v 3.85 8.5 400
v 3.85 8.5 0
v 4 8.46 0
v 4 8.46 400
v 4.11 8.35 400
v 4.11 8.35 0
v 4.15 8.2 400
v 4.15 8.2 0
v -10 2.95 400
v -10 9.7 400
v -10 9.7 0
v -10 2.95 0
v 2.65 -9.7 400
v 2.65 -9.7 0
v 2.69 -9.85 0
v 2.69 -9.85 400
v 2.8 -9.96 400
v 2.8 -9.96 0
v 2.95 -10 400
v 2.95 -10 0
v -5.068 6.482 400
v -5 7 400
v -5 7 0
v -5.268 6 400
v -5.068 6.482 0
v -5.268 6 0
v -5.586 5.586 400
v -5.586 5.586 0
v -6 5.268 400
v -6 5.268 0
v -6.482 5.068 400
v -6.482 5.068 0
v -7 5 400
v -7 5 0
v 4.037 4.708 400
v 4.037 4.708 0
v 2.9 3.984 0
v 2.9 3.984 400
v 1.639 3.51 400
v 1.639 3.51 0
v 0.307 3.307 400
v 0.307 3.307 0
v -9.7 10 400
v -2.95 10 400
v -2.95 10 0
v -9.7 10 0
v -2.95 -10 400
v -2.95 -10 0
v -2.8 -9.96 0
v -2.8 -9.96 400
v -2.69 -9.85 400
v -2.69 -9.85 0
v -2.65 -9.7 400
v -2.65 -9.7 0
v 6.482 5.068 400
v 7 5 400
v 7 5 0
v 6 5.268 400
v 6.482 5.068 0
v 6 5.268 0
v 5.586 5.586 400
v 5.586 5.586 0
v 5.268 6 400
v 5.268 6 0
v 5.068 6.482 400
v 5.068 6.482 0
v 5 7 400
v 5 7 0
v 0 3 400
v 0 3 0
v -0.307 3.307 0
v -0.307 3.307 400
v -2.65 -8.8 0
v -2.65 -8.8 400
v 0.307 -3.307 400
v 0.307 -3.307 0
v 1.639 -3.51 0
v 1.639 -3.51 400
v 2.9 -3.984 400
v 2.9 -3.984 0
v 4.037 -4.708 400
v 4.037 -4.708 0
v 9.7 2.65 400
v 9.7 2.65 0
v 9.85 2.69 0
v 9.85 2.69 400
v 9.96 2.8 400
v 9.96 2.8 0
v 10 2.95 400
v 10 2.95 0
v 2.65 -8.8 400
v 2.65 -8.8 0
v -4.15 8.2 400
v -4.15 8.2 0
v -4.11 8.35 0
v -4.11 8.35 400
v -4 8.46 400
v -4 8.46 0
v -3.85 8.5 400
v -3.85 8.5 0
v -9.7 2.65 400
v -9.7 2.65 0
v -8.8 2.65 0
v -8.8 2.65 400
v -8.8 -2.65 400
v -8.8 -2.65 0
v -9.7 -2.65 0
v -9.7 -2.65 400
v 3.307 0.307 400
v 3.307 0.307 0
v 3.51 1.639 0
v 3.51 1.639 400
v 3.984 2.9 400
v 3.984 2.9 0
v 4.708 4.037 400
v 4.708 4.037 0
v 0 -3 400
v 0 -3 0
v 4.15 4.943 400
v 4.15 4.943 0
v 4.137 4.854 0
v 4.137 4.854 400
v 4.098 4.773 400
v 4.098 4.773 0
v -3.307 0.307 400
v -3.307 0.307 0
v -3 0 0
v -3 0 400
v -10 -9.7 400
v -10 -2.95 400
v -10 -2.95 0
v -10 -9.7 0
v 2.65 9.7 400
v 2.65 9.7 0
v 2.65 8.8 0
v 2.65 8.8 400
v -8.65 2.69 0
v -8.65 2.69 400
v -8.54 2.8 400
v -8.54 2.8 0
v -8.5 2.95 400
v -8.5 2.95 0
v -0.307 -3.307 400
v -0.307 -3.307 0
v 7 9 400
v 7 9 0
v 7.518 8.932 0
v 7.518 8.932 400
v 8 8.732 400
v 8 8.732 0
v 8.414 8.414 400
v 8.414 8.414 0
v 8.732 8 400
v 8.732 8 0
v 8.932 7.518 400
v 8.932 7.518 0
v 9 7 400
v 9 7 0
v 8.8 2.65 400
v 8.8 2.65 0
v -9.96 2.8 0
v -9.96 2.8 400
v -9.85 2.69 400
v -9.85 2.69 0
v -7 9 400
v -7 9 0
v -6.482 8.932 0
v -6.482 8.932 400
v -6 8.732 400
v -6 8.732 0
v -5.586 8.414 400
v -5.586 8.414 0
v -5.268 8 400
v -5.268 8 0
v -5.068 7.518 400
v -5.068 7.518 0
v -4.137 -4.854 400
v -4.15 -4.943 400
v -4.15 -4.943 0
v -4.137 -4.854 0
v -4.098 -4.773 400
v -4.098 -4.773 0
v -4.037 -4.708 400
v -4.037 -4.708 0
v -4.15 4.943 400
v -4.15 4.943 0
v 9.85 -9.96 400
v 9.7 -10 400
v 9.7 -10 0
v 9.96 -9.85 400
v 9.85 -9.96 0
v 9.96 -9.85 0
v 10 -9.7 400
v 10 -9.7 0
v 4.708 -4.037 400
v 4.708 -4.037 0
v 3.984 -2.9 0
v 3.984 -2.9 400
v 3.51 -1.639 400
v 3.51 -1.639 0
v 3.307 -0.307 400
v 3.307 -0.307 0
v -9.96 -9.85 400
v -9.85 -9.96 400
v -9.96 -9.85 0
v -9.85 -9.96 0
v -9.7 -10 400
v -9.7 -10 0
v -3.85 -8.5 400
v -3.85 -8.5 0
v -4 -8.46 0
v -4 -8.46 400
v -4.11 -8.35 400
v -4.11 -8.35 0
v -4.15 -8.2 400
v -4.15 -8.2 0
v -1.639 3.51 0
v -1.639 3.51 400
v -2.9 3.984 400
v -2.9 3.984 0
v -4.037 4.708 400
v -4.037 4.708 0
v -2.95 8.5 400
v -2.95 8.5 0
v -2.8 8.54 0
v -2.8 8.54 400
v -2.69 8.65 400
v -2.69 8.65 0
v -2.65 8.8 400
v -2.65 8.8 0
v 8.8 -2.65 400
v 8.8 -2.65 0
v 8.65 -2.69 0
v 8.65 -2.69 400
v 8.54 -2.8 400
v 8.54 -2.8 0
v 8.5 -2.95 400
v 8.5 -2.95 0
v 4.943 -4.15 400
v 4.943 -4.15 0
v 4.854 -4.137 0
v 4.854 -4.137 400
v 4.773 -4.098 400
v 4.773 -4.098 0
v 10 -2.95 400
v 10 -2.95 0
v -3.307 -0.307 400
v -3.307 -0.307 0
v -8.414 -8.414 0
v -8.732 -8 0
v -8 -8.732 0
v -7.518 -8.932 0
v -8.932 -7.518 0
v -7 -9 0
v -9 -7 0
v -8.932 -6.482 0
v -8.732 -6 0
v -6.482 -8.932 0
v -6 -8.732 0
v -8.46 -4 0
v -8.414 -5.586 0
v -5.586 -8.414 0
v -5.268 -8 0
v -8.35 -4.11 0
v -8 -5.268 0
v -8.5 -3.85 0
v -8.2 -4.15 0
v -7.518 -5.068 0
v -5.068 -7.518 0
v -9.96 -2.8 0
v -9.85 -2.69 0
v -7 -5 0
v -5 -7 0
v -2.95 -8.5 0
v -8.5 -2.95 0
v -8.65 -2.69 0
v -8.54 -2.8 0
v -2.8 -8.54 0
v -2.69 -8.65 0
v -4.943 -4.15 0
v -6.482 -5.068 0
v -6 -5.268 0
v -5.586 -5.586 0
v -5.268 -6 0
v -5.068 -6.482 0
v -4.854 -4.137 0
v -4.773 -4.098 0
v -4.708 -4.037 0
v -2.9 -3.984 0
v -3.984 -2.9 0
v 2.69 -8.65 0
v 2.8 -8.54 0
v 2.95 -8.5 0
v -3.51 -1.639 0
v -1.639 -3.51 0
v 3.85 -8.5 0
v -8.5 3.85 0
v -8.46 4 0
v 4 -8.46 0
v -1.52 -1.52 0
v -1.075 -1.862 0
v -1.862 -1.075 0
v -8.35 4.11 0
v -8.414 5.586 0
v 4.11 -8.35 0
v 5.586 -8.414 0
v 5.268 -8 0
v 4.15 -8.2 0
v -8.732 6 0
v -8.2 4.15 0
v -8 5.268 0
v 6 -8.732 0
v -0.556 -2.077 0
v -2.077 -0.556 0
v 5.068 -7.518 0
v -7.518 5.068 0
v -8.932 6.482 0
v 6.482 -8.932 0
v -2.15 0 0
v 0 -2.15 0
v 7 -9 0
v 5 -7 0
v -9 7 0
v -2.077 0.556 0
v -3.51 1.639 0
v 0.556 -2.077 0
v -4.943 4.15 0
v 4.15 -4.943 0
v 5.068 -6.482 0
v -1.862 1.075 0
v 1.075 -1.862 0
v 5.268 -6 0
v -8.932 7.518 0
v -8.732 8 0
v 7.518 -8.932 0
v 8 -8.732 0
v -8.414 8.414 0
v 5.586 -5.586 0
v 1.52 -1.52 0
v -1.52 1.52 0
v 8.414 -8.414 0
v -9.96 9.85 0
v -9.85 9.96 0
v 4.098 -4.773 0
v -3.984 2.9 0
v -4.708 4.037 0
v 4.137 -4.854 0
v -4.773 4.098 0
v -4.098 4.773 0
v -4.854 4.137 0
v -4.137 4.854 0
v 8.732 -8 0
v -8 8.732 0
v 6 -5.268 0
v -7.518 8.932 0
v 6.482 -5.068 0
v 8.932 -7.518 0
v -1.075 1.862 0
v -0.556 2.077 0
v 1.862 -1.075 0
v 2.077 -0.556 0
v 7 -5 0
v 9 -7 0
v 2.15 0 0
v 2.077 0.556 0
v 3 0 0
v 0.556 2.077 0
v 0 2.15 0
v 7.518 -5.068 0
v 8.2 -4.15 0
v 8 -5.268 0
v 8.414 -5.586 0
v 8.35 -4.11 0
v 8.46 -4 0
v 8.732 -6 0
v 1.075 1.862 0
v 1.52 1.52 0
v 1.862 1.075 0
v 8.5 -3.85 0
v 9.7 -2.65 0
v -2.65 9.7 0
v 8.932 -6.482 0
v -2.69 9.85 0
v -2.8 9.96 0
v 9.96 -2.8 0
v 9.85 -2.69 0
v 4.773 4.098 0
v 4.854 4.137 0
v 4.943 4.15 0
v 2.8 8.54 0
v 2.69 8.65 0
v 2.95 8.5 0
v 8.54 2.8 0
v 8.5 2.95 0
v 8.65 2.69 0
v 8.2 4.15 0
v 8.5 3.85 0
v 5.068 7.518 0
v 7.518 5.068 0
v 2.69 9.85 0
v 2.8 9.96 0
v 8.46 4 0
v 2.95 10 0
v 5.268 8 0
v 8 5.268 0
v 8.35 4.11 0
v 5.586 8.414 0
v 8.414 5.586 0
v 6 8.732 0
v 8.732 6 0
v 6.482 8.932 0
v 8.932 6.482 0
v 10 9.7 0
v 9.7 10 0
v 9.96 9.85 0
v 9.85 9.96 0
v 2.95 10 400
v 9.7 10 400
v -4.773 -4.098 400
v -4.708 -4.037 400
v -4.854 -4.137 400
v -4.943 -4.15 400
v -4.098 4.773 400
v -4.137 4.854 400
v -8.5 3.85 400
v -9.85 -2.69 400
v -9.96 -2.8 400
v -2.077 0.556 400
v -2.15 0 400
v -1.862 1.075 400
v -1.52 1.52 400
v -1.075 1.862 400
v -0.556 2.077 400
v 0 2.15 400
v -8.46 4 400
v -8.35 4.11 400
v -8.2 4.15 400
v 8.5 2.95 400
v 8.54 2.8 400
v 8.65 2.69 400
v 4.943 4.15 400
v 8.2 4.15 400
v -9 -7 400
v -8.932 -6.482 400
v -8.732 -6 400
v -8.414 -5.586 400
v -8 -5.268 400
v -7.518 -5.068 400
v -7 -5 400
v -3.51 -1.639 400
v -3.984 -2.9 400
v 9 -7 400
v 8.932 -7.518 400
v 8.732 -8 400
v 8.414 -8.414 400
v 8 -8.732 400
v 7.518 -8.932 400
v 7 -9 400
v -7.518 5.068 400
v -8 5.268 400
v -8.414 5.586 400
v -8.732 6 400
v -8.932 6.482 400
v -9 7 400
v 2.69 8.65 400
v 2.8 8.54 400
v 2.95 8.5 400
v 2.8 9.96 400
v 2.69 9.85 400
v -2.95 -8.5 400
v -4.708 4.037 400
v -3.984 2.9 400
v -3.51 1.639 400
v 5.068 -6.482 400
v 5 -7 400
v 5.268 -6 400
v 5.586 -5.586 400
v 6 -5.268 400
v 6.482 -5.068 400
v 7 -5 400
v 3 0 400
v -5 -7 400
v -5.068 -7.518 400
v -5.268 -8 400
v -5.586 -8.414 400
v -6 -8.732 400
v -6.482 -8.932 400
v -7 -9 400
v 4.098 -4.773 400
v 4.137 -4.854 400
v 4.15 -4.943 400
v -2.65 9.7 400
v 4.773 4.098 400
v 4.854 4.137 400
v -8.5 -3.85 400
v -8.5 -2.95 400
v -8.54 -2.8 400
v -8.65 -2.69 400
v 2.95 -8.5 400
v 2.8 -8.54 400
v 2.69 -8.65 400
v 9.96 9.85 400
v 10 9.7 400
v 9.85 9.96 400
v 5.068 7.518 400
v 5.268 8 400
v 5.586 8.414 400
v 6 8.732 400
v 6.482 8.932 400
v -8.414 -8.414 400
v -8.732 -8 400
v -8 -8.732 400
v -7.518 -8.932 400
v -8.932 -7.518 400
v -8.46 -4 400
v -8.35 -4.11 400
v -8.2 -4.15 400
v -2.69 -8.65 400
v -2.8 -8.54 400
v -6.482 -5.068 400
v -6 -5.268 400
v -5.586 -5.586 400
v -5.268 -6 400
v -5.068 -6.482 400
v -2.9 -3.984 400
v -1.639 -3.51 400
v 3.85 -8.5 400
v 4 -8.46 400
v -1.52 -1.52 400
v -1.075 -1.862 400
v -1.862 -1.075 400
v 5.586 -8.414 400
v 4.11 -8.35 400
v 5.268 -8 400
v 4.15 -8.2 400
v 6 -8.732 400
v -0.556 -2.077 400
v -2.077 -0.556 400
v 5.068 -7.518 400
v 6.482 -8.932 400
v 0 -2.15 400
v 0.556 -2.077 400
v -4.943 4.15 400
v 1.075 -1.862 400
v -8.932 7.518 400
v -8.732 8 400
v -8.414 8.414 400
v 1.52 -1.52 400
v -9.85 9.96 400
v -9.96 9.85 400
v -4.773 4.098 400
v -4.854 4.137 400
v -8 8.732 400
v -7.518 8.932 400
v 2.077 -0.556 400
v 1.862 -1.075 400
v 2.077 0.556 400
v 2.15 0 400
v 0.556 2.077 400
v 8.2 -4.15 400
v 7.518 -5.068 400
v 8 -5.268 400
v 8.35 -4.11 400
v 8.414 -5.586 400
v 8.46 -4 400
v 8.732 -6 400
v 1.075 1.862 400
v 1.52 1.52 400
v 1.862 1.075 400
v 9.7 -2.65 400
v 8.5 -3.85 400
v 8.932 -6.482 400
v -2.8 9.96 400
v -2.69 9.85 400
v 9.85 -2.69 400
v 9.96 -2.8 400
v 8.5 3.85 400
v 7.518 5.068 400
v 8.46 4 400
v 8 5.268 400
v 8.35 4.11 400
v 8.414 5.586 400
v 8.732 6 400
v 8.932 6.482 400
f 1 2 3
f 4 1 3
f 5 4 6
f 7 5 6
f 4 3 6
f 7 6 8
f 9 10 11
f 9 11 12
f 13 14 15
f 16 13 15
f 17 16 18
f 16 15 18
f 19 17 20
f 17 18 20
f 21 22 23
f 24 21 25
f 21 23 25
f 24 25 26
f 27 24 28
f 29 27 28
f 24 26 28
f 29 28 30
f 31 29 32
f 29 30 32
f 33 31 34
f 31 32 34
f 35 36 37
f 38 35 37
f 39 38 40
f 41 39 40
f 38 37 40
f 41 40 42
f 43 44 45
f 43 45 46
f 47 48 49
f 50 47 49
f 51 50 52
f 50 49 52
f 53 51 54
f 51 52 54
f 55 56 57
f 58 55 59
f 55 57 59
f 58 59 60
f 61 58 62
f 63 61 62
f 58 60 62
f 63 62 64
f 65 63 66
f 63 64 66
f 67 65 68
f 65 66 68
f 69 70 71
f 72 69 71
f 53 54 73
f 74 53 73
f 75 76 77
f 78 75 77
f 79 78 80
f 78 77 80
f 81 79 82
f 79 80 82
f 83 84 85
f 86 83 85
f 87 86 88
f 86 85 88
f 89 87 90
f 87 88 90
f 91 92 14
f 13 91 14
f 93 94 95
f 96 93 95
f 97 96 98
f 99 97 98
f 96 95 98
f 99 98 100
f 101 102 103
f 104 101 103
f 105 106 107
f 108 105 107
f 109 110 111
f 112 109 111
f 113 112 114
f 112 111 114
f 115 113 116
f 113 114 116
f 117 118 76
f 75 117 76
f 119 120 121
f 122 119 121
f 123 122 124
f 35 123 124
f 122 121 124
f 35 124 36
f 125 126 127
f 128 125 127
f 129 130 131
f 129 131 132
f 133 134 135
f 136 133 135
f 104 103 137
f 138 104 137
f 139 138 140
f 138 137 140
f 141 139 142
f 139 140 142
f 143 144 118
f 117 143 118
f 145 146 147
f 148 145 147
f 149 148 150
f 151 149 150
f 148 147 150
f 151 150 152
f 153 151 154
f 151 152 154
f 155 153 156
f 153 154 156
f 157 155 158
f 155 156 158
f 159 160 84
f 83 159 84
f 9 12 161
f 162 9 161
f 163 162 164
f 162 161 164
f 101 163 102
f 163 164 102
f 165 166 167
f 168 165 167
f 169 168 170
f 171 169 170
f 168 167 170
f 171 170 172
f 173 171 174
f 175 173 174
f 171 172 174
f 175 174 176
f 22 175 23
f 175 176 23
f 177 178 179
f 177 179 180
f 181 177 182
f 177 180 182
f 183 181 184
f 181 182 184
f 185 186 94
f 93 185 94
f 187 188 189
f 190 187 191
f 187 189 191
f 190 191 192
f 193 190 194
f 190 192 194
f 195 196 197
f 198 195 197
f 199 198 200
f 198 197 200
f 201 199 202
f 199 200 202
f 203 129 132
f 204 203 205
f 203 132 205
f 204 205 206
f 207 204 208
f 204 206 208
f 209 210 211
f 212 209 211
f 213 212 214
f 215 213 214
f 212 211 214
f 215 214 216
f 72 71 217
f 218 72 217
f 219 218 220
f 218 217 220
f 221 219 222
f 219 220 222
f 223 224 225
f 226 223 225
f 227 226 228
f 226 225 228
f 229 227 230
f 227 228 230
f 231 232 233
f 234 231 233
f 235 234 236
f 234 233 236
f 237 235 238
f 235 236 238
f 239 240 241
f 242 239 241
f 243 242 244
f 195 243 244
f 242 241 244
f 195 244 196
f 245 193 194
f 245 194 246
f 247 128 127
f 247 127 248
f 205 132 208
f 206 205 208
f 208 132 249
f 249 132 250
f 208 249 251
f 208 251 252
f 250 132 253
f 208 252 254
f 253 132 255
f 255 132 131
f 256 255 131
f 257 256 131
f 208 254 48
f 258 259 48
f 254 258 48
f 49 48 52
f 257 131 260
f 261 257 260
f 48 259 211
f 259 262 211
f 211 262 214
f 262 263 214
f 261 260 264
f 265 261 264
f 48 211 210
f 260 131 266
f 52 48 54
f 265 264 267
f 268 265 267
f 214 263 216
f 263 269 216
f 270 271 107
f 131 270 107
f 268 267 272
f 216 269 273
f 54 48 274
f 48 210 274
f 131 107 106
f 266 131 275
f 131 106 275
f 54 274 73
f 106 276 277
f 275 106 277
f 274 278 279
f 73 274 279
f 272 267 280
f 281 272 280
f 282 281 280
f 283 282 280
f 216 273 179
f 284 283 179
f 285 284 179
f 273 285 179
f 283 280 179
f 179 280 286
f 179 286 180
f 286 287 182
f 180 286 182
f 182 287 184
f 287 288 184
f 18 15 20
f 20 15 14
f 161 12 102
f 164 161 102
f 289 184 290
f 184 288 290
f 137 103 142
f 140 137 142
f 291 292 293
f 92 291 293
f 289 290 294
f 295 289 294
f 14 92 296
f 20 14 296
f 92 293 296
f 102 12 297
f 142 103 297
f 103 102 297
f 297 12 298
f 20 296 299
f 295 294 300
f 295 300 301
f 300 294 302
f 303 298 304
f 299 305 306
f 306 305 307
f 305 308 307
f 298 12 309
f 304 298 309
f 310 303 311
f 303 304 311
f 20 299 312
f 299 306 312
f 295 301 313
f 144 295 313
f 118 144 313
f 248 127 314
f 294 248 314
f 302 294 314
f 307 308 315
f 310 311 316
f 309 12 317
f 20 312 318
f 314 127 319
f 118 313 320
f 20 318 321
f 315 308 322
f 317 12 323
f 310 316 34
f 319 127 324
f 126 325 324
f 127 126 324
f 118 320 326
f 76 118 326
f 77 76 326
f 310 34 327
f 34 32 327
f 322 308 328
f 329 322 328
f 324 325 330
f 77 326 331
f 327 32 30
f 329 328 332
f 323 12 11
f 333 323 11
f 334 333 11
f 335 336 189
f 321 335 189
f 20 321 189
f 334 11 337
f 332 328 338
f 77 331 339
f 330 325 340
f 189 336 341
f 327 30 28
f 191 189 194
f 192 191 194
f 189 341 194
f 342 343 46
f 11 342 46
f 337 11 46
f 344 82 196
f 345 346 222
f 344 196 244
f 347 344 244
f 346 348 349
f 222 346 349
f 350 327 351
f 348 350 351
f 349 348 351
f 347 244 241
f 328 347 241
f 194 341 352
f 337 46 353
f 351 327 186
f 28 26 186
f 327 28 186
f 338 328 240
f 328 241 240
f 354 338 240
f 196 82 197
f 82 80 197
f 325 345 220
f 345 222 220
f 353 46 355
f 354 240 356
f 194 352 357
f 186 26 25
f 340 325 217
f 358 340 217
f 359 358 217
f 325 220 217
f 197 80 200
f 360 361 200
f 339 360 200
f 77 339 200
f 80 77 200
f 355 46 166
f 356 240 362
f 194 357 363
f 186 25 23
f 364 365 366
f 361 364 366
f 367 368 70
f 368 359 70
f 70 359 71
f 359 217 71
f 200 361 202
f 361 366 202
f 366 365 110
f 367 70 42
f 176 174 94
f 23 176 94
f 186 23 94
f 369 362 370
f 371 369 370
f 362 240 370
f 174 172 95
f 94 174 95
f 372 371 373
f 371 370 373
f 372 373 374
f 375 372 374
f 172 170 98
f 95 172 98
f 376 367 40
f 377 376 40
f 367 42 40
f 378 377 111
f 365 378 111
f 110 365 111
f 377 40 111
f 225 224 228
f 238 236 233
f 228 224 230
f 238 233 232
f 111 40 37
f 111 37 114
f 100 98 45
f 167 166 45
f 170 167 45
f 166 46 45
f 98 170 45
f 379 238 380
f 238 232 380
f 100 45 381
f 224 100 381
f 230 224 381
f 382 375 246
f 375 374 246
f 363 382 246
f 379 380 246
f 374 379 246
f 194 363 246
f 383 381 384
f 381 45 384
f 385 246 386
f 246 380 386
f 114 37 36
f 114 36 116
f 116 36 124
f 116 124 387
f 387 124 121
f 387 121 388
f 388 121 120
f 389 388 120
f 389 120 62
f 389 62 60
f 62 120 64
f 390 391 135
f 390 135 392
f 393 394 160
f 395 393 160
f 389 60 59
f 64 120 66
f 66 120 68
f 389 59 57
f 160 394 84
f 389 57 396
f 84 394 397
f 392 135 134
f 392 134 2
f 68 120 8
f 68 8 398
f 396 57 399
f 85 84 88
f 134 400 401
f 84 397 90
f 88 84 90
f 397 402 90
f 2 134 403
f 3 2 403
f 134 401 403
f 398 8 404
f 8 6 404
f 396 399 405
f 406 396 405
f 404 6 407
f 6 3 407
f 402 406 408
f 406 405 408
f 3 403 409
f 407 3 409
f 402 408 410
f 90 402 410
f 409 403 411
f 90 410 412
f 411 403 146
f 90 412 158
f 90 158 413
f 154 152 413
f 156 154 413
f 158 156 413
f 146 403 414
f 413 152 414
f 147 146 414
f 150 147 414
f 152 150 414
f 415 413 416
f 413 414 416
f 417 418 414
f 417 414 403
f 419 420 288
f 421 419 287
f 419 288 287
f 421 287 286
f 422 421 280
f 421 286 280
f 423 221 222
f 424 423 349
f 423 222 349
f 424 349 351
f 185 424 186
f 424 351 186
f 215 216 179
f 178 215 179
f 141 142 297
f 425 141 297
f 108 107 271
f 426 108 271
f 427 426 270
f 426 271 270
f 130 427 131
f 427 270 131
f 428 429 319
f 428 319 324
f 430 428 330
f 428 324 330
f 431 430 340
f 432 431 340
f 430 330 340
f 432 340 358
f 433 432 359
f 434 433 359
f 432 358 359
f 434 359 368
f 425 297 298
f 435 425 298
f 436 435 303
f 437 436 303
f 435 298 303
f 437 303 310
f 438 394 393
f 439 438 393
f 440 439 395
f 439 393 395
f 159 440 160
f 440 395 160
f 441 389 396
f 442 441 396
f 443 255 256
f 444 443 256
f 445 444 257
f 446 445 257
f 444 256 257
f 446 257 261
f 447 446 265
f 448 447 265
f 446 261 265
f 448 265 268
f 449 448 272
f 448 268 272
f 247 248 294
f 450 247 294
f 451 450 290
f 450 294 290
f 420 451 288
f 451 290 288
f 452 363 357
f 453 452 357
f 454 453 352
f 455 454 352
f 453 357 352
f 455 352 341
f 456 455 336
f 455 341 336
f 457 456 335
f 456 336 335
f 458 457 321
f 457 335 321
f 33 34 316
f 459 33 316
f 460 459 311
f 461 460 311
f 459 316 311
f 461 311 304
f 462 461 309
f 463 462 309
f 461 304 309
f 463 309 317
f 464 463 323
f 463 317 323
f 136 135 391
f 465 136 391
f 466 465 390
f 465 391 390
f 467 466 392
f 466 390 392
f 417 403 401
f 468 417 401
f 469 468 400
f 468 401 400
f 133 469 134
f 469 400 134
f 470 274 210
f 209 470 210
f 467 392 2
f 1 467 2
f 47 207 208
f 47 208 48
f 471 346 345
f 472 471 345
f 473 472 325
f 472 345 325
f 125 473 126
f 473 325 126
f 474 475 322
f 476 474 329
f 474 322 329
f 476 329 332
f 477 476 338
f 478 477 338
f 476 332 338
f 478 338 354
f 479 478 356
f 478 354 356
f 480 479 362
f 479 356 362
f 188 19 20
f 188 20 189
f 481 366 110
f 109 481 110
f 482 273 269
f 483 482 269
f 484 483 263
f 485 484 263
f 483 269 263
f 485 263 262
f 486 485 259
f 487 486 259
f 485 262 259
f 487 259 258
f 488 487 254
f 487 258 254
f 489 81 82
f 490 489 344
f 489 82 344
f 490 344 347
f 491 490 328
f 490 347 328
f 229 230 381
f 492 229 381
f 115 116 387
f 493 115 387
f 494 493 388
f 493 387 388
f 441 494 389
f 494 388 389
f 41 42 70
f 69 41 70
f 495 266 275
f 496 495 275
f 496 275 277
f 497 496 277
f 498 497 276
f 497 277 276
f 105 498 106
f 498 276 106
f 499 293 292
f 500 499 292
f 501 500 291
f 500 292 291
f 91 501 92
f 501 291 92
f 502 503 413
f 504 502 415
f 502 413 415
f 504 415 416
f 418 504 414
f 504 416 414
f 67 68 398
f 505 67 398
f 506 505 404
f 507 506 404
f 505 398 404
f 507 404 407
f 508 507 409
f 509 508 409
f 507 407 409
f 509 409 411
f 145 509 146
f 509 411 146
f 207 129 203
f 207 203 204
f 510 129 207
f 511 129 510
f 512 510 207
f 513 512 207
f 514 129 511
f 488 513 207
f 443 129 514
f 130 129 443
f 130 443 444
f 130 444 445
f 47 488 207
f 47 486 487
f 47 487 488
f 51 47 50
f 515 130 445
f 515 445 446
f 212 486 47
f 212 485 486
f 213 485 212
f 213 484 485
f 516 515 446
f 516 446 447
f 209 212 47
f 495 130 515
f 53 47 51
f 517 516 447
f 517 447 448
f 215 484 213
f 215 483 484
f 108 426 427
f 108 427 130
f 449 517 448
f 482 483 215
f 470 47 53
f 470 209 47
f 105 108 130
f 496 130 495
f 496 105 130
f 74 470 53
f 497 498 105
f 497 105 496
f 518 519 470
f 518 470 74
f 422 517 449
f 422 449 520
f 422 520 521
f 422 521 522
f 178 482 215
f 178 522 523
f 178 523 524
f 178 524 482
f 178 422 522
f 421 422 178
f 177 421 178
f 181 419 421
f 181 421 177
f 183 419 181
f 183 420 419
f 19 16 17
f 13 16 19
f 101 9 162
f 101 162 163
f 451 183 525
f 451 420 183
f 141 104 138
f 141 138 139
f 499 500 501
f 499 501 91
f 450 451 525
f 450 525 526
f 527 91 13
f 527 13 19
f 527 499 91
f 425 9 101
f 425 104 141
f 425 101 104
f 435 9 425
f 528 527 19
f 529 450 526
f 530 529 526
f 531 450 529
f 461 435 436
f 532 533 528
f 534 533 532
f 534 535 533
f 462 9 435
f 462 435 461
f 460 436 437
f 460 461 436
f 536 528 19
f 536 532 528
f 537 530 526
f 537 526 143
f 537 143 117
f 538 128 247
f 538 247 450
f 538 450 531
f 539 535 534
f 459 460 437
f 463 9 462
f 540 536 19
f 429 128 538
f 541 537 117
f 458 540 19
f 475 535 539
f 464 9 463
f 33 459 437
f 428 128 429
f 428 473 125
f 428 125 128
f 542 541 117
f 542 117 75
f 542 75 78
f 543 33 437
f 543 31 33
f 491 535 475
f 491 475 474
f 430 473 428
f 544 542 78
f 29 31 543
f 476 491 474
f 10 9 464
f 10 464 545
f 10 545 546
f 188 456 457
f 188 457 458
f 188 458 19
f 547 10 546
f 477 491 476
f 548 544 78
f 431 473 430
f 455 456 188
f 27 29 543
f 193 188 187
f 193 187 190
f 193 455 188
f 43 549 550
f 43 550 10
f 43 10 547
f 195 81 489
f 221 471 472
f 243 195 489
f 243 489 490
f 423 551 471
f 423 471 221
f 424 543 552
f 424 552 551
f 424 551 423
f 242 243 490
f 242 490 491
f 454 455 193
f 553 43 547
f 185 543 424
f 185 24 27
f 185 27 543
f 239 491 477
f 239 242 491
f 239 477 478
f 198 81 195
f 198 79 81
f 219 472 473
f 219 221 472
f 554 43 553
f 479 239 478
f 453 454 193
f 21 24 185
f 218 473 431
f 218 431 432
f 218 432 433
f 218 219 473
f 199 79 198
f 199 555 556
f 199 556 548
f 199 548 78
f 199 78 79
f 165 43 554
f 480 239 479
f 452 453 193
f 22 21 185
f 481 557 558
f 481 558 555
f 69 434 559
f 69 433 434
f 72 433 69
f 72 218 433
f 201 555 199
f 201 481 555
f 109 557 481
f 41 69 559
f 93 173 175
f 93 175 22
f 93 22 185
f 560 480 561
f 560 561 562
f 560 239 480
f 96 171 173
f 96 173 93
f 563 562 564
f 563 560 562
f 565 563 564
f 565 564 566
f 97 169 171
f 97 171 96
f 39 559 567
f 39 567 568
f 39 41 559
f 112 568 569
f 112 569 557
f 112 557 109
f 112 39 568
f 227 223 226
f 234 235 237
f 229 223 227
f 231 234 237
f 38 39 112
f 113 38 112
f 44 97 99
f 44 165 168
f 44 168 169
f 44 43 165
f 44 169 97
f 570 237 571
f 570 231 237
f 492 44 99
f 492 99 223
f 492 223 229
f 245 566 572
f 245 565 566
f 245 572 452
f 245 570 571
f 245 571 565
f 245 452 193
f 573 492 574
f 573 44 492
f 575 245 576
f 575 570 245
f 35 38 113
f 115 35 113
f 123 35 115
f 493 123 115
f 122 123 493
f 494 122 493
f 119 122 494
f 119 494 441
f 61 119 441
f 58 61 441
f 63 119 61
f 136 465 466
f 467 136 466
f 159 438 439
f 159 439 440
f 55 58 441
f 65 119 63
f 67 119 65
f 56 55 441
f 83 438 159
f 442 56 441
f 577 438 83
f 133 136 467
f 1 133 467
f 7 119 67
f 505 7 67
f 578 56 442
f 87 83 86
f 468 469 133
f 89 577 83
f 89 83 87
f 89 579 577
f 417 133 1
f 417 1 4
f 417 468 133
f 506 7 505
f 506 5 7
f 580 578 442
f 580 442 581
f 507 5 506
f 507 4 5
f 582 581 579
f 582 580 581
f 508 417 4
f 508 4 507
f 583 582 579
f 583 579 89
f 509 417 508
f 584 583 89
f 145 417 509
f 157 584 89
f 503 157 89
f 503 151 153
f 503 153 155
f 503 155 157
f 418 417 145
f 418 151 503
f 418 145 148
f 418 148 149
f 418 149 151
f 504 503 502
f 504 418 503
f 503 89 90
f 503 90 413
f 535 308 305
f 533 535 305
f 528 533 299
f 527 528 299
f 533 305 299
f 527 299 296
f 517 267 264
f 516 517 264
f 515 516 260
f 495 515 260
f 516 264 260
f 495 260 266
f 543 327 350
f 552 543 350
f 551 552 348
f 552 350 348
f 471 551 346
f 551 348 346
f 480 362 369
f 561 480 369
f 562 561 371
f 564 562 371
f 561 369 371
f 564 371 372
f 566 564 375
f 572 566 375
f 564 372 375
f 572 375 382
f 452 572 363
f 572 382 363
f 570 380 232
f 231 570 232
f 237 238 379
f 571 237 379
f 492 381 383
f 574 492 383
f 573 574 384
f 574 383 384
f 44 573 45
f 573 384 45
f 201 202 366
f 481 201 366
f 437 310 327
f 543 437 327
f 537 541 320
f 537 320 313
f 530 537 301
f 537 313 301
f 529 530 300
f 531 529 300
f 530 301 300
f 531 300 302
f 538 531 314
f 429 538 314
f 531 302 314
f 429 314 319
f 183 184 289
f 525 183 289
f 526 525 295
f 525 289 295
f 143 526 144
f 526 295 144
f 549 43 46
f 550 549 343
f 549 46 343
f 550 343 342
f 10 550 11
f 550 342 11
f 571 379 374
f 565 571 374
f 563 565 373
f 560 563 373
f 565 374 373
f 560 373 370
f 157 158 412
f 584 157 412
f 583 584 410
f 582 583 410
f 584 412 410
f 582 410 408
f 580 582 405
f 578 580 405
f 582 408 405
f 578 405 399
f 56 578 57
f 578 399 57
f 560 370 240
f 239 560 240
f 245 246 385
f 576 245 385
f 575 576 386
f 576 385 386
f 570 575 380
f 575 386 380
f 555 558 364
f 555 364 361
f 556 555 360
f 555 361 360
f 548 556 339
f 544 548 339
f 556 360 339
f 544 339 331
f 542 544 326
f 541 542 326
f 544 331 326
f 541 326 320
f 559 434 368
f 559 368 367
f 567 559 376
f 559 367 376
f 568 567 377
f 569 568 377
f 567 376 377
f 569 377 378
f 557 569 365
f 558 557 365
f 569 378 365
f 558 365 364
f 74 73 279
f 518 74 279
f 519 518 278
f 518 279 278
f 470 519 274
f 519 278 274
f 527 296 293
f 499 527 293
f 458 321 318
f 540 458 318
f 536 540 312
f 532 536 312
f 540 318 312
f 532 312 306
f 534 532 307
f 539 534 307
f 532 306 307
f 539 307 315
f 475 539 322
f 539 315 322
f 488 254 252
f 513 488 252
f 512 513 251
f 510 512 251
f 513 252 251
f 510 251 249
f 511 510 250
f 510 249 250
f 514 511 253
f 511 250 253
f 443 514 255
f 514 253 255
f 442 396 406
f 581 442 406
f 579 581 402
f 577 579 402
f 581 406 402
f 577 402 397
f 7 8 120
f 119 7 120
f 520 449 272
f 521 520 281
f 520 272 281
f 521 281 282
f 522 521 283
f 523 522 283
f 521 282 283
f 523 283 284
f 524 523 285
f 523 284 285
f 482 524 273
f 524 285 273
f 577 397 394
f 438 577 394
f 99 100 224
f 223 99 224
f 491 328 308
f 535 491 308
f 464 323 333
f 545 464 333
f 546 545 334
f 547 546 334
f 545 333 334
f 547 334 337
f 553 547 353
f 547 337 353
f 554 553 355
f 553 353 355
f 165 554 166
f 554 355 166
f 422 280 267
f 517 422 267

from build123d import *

# Parameters (mm, degrees)
F1_DEPTH = 400


# Not quite as in the source:
# - ends of sketch curves that miss each other by under 0.0002 mm in the source are joined


with BuildPart() as f1:
    # F0 (on Top) → F1 (new body)
    with BuildSketch(Plane.XY):
        with BuildLine():
            ThreePointArc((0, 2.15), (1.5202795796, 1.5202795796), (2.15, 0))
            Line((2.15, 0), (3, 0))
            Line((3, 0), (3.307278, 0.307278))
            ThreePointArc((3.307278, 0.307278), (3.7143803747, 2.2820219924), (4.7078187099, 4.0365664363))
            ThreePointArc((4.7078187099, 4.0365664363), (4.812308461, 4.1201573706), (4.94275, 4.15))
            Line((4.94275, 4.15), (8.2, 4.15))
            ThreePointArc((8.2, 4.15), (8.4121320344, 4.0621320344), (8.5, 3.85))
            Line((8.5, 3.85), (8.5, 2.95))
            ThreePointArc((8.5, 2.95), (8.5878679656, 2.7378679656), (8.8, 2.65))
            Line((8.8, 2.65), (9.7, 2.65))
            ThreePointArc((9.7, 2.65), (9.9121320344, 2.7378679656), (10, 2.95))
            Line((10, 2.95), (10, 9.7))
            ThreePointArc((10, 9.7), (9.9121320344, 9.9121320344), (9.7, 10))
            Line((9.7, 10), (2.95, 10))
            ThreePointArc((2.95, 10), (2.7378679656, 9.9121320344), (2.65, 9.7))
            Line((2.65, 9.7), (2.65, 8.8))
            ThreePointArc((2.65, 8.8), (2.7378679656, 8.5878679656), (2.95, 8.5))
            Line((2.95, 8.5), (3.85, 8.5))
            ThreePointArc((3.85, 8.5), (4.0621320344, 8.4121320344), (4.15, 8.2))
            Line((4.15, 8.2), (4.15, 4.94275))
            ThreePointArc((4.15, 4.94275), (4.1201572004, 4.8123081084), (4.036566086, 4.7078178916))
            ThreePointArc((4.036566086, 4.7078178916), (2.2820216259, 3.7143802371), (0.3072779813, 3.3072783955))
            Line((0.3072779813, 3.3072783955), (0, 3))
            Line((0, 3), (0, 2.15))
        make_face()
        with BuildLine():
            ThreePointArc((7, 9), (8.4142135624, 8.4142135624), (9, 7))
            ThreePointArc((9, 7), (8.4142135624, 5.5857864376), (7, 5))
            ThreePointArc((7, 5), (5.5857864376, 5.5857864376), (5, 7))
            ThreePointArc((5, 7), (5.5857864376, 8.4142135624), (7, 9))
        make_face(mode=Mode.SUBTRACT)
        with BuildLine():
            Line((3, 0), (2.15, 0))
            ThreePointArc((2.15, 0), (1.5202795796, -1.5202795796), (0, -2.15))
            Line((0, -2.15), (0, -3))
            Line((0, -3), (0.307278, -3.307277))
            ThreePointArc((0.307278, -3.307277), (2.2820216259, -3.7143792371), (4.036565823, -4.7078172229))
            ThreePointArc((4.036565823, -4.7078172229), (4.1201572004, -4.8123071084), (4.15, -4.942749))
            Line((4.15, -4.942749), (4.15, -8.2))
            ThreePointArc((4.15, -8.2), (4.0621320344, -8.4121320344), (3.85, -8.5))
            Line((3.85, -8.5), (2.95, -8.5))
            ThreePointArc((2.95, -8.5), (2.7378679656, -8.5878679656), (2.65, -8.8))
            Line((2.65, -8.8), (2.65, -9.7))
            ThreePointArc((2.65, -9.7), (2.7378679656, -9.9121320344), (2.95, -10))
            Line((2.95, -10), (9.7, -10))
            ThreePointArc((9.7, -10), (9.9121320344, -9.9121320344), (10, -9.7))
            Line((10, -9.7), (10, -2.95))
            ThreePointArc((10, -2.95), (9.9121320344, -2.7378679656), (9.7, -2.65))
            Line((9.7, -2.65), (8.8, -2.65))
            ThreePointArc((8.8, -2.65), (8.5878679656, -2.7378679656), (8.5, -2.95))
            Line((8.5, -2.95), (8.5, -3.85))
            ThreePointArc((8.5, -3.85), (8.4121320344, -4.0621320344), (8.2, -4.15))
            Line((8.2, -4.15), (4.94275, -4.15))
            ThreePointArc((4.94275, -4.15), (4.8123081084, -4.1201572004), (4.7078178916, -4.036566086))
            ThreePointArc((4.7078178916, -4.036566086), (3.7143800615, -2.2820211583), (3.3072783483, -0.3072769835))
            Line((3.3072783483, -0.3072769835), (3, 0))
        make_face()
        with BuildLine():
            ThreePointArc((7, -5), (8.4142135624, -5.5857864376), (9, -7))
            ThreePointArc((9, -7), (8.4142135624, -8.4142135624), (7, -9))
            ThreePointArc((7, -9), (5.5857864376, -8.4142135624), (5, -7))
            ThreePointArc((5, -7), (5.5857864376, -5.5857864376), (7, -5))
        make_face(mode=Mode.SUBTRACT)
        with BuildLine():
            Line((0, -3), (0, -2.15))
            ThreePointArc((0, -2.15), (-1.5202795796, -1.5202795796), (-2.15, 0))
            Line((-2.15, 0), (-3, 0))
            Line((-3, 0), (-3.307277, -0.307277))
            ThreePointArc((-3.307277, -0.307277), (-3.7143790615, -2.2820211583), (-4.7078172229, -4.036565823))
            ThreePointArc((-4.7078172229, -4.036565823), (-4.8123071084, -4.1201572004), (-4.942749, -4.15))
            Line((-4.942749, -4.15), (-8.2, -4.15))
            ThreePointArc((-8.2, -4.15), (-8.4121320344, -4.0621320344), (-8.5, -3.85))
            Line((-8.5, -3.85), (-8.5, -2.95))
            ThreePointArc((-8.5, -2.95), (-8.5878679656, -2.7378679656), (-8.8, -2.65))
            Line((-8.8, -2.65), (-9.7, -2.65))
            ThreePointArc((-9.7, -2.65), (-9.9121320344, -2.7378679656), (-10, -2.95))
            Line((-10, -2.95), (-10, -9.7))
            ThreePointArc((-10, -9.7), (-9.9121320344, -9.9121320344), (-9.7, -10))
            Line((-9.7, -10), (-2.95, -10))
            ThreePointArc((-2.95, -10), (-2.7378679656, -9.9121320344), (-2.65, -9.7))
            Line((-2.65, -9.7), (-2.65, -8.8))
            ThreePointArc((-2.65, -8.8), (-2.7378679656, -8.5878679656), (-2.95, -8.5))
            Line((-2.95, -8.5), (-3.85, -8.5))
            ThreePointArc((-3.85, -8.5), (-4.0621320344, -8.4121320344), (-4.15, -8.2))
            Line((-4.15, -8.2), (-4.15, -4.942749))
            ThreePointArc((-4.15, -4.942749), (-4.1201572004, -4.8123071084), (-4.036566086, -4.7078168916))
            ThreePointArc((-4.036566086, -4.7078168916), (-2.2820211583, -3.7143790615), (-0.3072769835, -3.3072773483))
            Line((-0.3072769835, -3.3072773483), (0, -3))
        make_face()
        with BuildLine():
            ThreePointArc((-7, -9), (-8.4142135624, -8.4142135624), (-9, -7))
            ThreePointArc((-9, -7), (-8.4142135624, -5.5857864376), (-7, -5))
            ThreePointArc((-7, -5), (-5.5857864376, -5.5857864376), (-5, -7))
            ThreePointArc((-5, -7), (-5.5857864376, -8.4142135624), (-7, -9))
        make_face(mode=Mode.SUBTRACT)
        with BuildLine():
            ThreePointArc((-2.15, 0), (-1.5202795796, 1.5202795796), (0, 2.15))
            Line((0, 2.15), (0, 3))
            Line((0, 3), (-0.307277, 3.307278))
            ThreePointArc((-0.307277, 3.307278), (-2.2820211583, 3.7143800615), (-4.036565823, 4.7078182229))
            ThreePointArc((-4.036565823, 4.7078182229), (-4.1201572004, 4.8123081084), (-4.15, 4.94275))
            Line((-4.15, 4.94275), (-4.15, 8.2))
            ThreePointArc((-4.15, 8.2), (-4.0621320344, 8.4121320344), (-3.85, 8.5))
            Line((-3.85, 8.5), (-2.95, 8.5))
            ThreePointArc((-2.95, 8.5), (-2.7378679656, 8.5878679656), (-2.65, 8.8))
            Line((-2.65, 8.8), (-2.65, 9.7))
            ThreePointArc((-2.65, 9.7), (-2.7378679656, 9.9121320344), (-2.95, 10))
            Line((-2.95, 10), (-9.7, 10))
            ThreePointArc((-9.7, 10), (-9.9121320344, 9.9121320344), (-10, 9.7))
            Line((-10, 9.7), (-10, 2.95))
            ThreePointArc((-10, 2.95), (-9.9121320344, 2.7378679656), (-9.7, 2.65))
            Line((-9.7, 2.65), (-8.8, 2.65))
            ThreePointArc((-8.8, 2.65), (-8.5878679656, 2.7378679656), (-8.5, 2.95))
            Line((-8.5, 2.95), (-8.5, 3.85))
            ThreePointArc((-8.5, 3.85), (-8.4121320344, 4.0621320344), (-8.2, 4.15))
            Line((-8.2, 4.15), (-4.942749, 4.15))
            ThreePointArc((-4.942749, 4.15), (-4.812307461, 4.1201573706), (-4.7078173786, 4.0365666993))
            ThreePointArc((-4.7078173786, 4.0365666993), (-3.7143793747, 2.2820219924), (-3.3072773955, 0.3072779813))
            Line((-3.3072773955, 0.3072779813), (-3, 0))
            Line((-3, 0), (-2.15, 0))
        make_face()
        with BuildLine():
            ThreePointArc((-7, 5), (-8.4142135624, 5.5857864376), (-9, 7))
            ThreePointArc((-9, 7), (-8.4142135624, 8.4142135624), (-7, 9))
            ThreePointArc((-7, 9), (-5.5857864376, 8.4142135624), (-5, 7))
            ThreePointArc((-5, 7), (-5.5857864376, 5.5857864376), (-7, 5))
        make_face(mode=Mode.SUBTRACT)
    extrude(amount=F1_DEPTH)


solid = f1.part
